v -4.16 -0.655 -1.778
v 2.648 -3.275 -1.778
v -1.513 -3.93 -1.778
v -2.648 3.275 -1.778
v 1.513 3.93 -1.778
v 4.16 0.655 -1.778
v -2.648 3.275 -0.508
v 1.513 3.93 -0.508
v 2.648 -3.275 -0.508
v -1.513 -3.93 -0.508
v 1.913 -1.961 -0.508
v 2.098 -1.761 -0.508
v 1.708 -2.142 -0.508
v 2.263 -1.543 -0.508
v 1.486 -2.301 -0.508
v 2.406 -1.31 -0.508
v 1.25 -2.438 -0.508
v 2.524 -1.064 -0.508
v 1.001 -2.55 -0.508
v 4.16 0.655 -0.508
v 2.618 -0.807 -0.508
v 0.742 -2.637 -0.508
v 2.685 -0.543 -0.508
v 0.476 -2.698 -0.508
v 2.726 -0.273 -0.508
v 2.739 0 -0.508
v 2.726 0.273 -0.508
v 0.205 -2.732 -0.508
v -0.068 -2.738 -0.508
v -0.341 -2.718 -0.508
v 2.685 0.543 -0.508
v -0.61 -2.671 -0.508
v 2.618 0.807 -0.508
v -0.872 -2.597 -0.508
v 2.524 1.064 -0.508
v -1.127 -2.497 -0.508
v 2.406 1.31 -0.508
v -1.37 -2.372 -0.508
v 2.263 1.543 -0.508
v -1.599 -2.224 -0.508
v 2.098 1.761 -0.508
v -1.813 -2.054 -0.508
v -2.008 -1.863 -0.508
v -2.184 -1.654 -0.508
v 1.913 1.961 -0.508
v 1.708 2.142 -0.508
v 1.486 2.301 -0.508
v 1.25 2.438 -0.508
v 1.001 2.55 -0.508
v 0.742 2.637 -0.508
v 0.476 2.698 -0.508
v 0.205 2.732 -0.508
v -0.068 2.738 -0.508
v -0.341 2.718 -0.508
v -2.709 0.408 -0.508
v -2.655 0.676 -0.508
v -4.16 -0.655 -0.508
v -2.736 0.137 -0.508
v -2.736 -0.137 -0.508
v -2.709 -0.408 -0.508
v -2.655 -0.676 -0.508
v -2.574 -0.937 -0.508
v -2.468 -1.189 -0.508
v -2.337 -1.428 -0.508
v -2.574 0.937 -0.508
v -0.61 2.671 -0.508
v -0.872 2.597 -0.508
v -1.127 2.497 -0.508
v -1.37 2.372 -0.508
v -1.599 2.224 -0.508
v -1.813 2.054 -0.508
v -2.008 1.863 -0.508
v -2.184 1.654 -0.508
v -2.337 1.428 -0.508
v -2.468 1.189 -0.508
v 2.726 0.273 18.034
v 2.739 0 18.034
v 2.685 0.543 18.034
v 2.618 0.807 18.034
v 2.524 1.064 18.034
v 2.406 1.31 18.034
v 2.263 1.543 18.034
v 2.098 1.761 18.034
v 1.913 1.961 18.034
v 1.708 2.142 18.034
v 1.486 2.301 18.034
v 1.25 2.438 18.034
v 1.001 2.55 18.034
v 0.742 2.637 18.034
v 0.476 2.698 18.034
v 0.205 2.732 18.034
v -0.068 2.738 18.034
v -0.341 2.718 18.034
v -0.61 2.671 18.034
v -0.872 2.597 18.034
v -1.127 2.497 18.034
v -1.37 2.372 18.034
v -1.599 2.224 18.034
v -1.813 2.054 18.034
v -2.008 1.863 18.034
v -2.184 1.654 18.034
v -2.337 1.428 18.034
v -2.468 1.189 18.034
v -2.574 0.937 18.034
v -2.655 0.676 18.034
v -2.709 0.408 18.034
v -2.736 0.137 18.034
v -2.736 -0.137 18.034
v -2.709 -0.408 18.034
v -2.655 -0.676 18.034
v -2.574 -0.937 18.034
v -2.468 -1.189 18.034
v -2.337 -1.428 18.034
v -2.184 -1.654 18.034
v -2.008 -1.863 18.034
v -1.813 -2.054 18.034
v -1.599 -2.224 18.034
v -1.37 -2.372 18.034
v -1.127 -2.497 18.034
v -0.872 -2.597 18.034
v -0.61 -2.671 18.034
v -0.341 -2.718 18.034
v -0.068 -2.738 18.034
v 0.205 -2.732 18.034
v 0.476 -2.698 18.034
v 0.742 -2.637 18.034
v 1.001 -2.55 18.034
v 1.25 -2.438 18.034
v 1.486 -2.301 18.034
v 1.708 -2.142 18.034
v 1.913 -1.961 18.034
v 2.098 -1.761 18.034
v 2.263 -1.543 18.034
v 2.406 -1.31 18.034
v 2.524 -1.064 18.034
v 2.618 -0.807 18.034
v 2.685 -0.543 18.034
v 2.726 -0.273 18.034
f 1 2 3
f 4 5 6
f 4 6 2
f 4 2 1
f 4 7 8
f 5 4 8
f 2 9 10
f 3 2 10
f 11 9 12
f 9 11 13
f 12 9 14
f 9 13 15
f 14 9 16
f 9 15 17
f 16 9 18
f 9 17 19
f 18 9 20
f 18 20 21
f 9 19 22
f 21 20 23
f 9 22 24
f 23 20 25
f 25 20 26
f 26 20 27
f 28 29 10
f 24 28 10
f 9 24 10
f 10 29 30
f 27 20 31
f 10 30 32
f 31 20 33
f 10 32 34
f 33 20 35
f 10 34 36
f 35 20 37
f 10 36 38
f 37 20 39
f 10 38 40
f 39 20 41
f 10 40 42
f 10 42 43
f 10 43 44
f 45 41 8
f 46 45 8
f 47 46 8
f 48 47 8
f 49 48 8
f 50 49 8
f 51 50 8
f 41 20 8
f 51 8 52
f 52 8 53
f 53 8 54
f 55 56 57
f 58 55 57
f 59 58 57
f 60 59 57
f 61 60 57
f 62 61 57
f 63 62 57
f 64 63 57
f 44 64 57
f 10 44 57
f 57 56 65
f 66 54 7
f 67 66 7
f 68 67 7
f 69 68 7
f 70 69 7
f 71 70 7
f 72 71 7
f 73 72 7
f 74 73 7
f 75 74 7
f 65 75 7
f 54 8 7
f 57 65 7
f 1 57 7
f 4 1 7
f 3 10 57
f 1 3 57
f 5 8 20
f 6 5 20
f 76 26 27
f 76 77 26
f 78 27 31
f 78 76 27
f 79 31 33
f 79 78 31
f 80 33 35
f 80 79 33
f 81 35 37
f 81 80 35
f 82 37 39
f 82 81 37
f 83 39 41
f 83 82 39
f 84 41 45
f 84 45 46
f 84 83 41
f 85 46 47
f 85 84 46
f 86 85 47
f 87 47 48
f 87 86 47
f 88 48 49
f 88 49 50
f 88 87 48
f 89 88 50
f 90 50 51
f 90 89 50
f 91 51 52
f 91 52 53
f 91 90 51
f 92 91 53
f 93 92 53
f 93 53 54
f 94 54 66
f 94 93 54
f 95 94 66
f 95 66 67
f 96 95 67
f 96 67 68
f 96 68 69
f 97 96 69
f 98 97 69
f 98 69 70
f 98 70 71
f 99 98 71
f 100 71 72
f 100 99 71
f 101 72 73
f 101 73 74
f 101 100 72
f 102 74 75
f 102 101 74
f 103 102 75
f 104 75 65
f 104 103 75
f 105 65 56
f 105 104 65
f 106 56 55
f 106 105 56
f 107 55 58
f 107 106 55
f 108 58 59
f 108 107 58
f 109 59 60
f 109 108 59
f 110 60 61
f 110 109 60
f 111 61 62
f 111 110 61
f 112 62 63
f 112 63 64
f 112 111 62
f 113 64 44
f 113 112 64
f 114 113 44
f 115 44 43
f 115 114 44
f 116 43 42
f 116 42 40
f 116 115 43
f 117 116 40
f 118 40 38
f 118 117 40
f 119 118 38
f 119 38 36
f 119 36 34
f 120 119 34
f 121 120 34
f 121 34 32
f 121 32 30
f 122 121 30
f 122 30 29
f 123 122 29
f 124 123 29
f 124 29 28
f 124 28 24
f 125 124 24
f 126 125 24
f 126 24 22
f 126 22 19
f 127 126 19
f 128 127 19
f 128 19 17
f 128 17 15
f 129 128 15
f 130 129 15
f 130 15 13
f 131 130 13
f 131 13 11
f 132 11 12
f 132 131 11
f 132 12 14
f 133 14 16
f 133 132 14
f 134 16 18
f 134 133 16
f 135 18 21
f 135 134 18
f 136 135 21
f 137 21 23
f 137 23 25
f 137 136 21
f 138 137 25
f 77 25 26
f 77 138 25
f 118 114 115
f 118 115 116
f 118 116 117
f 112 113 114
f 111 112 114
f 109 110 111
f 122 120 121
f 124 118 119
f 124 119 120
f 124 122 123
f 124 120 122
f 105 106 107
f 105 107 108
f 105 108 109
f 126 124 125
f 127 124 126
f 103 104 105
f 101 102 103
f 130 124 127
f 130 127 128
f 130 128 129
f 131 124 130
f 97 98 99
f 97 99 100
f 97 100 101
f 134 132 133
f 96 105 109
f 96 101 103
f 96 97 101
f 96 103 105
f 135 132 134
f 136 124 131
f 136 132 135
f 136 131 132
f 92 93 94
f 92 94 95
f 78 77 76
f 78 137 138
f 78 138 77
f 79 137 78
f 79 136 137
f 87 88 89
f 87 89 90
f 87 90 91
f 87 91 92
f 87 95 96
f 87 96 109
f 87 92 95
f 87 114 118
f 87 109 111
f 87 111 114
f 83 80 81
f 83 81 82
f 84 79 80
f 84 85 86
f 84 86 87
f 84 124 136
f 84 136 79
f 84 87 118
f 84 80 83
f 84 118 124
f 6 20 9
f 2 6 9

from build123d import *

# Parameters (mm, degrees)
SKETCH1_R                = 2.73924182
BOSS_EXTRUDE1_DEPTH      = 18.034
BOSS_EXTRUDE1_DEPTH_BACK = 0.508
BOSS_EXTRUDE2_DEPTH      = 1.27


with BuildPart() as part:
    # Sketch1 → Boss-Extrude1 (new body, two sides)
    with BuildSketch(Plane.XY) as boss_extrude1_sk:
        Circle(SKETCH1_R)
    extrude(amount=BOSS_EXTRUDE1_DEPTH)
    extrude(boss_extrude1_sk.sketch, amount=-BOSS_EXTRUDE1_DEPTH_BACK)

    # Sketch2 → Boss-Extrude2 (add)
    with BuildSketch(Plane(origin=(0, 0, -0.508), x_dir=(-1, 0, 0), z_dir=(0, 0, -1))):
        Polygon((2.647524392, 3.275316604), (-1.512745189, 3.930481683), (-4.160269581, 0.655165078), (-2.647524392, -3.275316604), (1.512745189, -3.930481683), (4.160269581, -0.655165078), align=None)
    extrude(amount=BOSS_EXTRUDE2_DEPTH)


solid = part.part
